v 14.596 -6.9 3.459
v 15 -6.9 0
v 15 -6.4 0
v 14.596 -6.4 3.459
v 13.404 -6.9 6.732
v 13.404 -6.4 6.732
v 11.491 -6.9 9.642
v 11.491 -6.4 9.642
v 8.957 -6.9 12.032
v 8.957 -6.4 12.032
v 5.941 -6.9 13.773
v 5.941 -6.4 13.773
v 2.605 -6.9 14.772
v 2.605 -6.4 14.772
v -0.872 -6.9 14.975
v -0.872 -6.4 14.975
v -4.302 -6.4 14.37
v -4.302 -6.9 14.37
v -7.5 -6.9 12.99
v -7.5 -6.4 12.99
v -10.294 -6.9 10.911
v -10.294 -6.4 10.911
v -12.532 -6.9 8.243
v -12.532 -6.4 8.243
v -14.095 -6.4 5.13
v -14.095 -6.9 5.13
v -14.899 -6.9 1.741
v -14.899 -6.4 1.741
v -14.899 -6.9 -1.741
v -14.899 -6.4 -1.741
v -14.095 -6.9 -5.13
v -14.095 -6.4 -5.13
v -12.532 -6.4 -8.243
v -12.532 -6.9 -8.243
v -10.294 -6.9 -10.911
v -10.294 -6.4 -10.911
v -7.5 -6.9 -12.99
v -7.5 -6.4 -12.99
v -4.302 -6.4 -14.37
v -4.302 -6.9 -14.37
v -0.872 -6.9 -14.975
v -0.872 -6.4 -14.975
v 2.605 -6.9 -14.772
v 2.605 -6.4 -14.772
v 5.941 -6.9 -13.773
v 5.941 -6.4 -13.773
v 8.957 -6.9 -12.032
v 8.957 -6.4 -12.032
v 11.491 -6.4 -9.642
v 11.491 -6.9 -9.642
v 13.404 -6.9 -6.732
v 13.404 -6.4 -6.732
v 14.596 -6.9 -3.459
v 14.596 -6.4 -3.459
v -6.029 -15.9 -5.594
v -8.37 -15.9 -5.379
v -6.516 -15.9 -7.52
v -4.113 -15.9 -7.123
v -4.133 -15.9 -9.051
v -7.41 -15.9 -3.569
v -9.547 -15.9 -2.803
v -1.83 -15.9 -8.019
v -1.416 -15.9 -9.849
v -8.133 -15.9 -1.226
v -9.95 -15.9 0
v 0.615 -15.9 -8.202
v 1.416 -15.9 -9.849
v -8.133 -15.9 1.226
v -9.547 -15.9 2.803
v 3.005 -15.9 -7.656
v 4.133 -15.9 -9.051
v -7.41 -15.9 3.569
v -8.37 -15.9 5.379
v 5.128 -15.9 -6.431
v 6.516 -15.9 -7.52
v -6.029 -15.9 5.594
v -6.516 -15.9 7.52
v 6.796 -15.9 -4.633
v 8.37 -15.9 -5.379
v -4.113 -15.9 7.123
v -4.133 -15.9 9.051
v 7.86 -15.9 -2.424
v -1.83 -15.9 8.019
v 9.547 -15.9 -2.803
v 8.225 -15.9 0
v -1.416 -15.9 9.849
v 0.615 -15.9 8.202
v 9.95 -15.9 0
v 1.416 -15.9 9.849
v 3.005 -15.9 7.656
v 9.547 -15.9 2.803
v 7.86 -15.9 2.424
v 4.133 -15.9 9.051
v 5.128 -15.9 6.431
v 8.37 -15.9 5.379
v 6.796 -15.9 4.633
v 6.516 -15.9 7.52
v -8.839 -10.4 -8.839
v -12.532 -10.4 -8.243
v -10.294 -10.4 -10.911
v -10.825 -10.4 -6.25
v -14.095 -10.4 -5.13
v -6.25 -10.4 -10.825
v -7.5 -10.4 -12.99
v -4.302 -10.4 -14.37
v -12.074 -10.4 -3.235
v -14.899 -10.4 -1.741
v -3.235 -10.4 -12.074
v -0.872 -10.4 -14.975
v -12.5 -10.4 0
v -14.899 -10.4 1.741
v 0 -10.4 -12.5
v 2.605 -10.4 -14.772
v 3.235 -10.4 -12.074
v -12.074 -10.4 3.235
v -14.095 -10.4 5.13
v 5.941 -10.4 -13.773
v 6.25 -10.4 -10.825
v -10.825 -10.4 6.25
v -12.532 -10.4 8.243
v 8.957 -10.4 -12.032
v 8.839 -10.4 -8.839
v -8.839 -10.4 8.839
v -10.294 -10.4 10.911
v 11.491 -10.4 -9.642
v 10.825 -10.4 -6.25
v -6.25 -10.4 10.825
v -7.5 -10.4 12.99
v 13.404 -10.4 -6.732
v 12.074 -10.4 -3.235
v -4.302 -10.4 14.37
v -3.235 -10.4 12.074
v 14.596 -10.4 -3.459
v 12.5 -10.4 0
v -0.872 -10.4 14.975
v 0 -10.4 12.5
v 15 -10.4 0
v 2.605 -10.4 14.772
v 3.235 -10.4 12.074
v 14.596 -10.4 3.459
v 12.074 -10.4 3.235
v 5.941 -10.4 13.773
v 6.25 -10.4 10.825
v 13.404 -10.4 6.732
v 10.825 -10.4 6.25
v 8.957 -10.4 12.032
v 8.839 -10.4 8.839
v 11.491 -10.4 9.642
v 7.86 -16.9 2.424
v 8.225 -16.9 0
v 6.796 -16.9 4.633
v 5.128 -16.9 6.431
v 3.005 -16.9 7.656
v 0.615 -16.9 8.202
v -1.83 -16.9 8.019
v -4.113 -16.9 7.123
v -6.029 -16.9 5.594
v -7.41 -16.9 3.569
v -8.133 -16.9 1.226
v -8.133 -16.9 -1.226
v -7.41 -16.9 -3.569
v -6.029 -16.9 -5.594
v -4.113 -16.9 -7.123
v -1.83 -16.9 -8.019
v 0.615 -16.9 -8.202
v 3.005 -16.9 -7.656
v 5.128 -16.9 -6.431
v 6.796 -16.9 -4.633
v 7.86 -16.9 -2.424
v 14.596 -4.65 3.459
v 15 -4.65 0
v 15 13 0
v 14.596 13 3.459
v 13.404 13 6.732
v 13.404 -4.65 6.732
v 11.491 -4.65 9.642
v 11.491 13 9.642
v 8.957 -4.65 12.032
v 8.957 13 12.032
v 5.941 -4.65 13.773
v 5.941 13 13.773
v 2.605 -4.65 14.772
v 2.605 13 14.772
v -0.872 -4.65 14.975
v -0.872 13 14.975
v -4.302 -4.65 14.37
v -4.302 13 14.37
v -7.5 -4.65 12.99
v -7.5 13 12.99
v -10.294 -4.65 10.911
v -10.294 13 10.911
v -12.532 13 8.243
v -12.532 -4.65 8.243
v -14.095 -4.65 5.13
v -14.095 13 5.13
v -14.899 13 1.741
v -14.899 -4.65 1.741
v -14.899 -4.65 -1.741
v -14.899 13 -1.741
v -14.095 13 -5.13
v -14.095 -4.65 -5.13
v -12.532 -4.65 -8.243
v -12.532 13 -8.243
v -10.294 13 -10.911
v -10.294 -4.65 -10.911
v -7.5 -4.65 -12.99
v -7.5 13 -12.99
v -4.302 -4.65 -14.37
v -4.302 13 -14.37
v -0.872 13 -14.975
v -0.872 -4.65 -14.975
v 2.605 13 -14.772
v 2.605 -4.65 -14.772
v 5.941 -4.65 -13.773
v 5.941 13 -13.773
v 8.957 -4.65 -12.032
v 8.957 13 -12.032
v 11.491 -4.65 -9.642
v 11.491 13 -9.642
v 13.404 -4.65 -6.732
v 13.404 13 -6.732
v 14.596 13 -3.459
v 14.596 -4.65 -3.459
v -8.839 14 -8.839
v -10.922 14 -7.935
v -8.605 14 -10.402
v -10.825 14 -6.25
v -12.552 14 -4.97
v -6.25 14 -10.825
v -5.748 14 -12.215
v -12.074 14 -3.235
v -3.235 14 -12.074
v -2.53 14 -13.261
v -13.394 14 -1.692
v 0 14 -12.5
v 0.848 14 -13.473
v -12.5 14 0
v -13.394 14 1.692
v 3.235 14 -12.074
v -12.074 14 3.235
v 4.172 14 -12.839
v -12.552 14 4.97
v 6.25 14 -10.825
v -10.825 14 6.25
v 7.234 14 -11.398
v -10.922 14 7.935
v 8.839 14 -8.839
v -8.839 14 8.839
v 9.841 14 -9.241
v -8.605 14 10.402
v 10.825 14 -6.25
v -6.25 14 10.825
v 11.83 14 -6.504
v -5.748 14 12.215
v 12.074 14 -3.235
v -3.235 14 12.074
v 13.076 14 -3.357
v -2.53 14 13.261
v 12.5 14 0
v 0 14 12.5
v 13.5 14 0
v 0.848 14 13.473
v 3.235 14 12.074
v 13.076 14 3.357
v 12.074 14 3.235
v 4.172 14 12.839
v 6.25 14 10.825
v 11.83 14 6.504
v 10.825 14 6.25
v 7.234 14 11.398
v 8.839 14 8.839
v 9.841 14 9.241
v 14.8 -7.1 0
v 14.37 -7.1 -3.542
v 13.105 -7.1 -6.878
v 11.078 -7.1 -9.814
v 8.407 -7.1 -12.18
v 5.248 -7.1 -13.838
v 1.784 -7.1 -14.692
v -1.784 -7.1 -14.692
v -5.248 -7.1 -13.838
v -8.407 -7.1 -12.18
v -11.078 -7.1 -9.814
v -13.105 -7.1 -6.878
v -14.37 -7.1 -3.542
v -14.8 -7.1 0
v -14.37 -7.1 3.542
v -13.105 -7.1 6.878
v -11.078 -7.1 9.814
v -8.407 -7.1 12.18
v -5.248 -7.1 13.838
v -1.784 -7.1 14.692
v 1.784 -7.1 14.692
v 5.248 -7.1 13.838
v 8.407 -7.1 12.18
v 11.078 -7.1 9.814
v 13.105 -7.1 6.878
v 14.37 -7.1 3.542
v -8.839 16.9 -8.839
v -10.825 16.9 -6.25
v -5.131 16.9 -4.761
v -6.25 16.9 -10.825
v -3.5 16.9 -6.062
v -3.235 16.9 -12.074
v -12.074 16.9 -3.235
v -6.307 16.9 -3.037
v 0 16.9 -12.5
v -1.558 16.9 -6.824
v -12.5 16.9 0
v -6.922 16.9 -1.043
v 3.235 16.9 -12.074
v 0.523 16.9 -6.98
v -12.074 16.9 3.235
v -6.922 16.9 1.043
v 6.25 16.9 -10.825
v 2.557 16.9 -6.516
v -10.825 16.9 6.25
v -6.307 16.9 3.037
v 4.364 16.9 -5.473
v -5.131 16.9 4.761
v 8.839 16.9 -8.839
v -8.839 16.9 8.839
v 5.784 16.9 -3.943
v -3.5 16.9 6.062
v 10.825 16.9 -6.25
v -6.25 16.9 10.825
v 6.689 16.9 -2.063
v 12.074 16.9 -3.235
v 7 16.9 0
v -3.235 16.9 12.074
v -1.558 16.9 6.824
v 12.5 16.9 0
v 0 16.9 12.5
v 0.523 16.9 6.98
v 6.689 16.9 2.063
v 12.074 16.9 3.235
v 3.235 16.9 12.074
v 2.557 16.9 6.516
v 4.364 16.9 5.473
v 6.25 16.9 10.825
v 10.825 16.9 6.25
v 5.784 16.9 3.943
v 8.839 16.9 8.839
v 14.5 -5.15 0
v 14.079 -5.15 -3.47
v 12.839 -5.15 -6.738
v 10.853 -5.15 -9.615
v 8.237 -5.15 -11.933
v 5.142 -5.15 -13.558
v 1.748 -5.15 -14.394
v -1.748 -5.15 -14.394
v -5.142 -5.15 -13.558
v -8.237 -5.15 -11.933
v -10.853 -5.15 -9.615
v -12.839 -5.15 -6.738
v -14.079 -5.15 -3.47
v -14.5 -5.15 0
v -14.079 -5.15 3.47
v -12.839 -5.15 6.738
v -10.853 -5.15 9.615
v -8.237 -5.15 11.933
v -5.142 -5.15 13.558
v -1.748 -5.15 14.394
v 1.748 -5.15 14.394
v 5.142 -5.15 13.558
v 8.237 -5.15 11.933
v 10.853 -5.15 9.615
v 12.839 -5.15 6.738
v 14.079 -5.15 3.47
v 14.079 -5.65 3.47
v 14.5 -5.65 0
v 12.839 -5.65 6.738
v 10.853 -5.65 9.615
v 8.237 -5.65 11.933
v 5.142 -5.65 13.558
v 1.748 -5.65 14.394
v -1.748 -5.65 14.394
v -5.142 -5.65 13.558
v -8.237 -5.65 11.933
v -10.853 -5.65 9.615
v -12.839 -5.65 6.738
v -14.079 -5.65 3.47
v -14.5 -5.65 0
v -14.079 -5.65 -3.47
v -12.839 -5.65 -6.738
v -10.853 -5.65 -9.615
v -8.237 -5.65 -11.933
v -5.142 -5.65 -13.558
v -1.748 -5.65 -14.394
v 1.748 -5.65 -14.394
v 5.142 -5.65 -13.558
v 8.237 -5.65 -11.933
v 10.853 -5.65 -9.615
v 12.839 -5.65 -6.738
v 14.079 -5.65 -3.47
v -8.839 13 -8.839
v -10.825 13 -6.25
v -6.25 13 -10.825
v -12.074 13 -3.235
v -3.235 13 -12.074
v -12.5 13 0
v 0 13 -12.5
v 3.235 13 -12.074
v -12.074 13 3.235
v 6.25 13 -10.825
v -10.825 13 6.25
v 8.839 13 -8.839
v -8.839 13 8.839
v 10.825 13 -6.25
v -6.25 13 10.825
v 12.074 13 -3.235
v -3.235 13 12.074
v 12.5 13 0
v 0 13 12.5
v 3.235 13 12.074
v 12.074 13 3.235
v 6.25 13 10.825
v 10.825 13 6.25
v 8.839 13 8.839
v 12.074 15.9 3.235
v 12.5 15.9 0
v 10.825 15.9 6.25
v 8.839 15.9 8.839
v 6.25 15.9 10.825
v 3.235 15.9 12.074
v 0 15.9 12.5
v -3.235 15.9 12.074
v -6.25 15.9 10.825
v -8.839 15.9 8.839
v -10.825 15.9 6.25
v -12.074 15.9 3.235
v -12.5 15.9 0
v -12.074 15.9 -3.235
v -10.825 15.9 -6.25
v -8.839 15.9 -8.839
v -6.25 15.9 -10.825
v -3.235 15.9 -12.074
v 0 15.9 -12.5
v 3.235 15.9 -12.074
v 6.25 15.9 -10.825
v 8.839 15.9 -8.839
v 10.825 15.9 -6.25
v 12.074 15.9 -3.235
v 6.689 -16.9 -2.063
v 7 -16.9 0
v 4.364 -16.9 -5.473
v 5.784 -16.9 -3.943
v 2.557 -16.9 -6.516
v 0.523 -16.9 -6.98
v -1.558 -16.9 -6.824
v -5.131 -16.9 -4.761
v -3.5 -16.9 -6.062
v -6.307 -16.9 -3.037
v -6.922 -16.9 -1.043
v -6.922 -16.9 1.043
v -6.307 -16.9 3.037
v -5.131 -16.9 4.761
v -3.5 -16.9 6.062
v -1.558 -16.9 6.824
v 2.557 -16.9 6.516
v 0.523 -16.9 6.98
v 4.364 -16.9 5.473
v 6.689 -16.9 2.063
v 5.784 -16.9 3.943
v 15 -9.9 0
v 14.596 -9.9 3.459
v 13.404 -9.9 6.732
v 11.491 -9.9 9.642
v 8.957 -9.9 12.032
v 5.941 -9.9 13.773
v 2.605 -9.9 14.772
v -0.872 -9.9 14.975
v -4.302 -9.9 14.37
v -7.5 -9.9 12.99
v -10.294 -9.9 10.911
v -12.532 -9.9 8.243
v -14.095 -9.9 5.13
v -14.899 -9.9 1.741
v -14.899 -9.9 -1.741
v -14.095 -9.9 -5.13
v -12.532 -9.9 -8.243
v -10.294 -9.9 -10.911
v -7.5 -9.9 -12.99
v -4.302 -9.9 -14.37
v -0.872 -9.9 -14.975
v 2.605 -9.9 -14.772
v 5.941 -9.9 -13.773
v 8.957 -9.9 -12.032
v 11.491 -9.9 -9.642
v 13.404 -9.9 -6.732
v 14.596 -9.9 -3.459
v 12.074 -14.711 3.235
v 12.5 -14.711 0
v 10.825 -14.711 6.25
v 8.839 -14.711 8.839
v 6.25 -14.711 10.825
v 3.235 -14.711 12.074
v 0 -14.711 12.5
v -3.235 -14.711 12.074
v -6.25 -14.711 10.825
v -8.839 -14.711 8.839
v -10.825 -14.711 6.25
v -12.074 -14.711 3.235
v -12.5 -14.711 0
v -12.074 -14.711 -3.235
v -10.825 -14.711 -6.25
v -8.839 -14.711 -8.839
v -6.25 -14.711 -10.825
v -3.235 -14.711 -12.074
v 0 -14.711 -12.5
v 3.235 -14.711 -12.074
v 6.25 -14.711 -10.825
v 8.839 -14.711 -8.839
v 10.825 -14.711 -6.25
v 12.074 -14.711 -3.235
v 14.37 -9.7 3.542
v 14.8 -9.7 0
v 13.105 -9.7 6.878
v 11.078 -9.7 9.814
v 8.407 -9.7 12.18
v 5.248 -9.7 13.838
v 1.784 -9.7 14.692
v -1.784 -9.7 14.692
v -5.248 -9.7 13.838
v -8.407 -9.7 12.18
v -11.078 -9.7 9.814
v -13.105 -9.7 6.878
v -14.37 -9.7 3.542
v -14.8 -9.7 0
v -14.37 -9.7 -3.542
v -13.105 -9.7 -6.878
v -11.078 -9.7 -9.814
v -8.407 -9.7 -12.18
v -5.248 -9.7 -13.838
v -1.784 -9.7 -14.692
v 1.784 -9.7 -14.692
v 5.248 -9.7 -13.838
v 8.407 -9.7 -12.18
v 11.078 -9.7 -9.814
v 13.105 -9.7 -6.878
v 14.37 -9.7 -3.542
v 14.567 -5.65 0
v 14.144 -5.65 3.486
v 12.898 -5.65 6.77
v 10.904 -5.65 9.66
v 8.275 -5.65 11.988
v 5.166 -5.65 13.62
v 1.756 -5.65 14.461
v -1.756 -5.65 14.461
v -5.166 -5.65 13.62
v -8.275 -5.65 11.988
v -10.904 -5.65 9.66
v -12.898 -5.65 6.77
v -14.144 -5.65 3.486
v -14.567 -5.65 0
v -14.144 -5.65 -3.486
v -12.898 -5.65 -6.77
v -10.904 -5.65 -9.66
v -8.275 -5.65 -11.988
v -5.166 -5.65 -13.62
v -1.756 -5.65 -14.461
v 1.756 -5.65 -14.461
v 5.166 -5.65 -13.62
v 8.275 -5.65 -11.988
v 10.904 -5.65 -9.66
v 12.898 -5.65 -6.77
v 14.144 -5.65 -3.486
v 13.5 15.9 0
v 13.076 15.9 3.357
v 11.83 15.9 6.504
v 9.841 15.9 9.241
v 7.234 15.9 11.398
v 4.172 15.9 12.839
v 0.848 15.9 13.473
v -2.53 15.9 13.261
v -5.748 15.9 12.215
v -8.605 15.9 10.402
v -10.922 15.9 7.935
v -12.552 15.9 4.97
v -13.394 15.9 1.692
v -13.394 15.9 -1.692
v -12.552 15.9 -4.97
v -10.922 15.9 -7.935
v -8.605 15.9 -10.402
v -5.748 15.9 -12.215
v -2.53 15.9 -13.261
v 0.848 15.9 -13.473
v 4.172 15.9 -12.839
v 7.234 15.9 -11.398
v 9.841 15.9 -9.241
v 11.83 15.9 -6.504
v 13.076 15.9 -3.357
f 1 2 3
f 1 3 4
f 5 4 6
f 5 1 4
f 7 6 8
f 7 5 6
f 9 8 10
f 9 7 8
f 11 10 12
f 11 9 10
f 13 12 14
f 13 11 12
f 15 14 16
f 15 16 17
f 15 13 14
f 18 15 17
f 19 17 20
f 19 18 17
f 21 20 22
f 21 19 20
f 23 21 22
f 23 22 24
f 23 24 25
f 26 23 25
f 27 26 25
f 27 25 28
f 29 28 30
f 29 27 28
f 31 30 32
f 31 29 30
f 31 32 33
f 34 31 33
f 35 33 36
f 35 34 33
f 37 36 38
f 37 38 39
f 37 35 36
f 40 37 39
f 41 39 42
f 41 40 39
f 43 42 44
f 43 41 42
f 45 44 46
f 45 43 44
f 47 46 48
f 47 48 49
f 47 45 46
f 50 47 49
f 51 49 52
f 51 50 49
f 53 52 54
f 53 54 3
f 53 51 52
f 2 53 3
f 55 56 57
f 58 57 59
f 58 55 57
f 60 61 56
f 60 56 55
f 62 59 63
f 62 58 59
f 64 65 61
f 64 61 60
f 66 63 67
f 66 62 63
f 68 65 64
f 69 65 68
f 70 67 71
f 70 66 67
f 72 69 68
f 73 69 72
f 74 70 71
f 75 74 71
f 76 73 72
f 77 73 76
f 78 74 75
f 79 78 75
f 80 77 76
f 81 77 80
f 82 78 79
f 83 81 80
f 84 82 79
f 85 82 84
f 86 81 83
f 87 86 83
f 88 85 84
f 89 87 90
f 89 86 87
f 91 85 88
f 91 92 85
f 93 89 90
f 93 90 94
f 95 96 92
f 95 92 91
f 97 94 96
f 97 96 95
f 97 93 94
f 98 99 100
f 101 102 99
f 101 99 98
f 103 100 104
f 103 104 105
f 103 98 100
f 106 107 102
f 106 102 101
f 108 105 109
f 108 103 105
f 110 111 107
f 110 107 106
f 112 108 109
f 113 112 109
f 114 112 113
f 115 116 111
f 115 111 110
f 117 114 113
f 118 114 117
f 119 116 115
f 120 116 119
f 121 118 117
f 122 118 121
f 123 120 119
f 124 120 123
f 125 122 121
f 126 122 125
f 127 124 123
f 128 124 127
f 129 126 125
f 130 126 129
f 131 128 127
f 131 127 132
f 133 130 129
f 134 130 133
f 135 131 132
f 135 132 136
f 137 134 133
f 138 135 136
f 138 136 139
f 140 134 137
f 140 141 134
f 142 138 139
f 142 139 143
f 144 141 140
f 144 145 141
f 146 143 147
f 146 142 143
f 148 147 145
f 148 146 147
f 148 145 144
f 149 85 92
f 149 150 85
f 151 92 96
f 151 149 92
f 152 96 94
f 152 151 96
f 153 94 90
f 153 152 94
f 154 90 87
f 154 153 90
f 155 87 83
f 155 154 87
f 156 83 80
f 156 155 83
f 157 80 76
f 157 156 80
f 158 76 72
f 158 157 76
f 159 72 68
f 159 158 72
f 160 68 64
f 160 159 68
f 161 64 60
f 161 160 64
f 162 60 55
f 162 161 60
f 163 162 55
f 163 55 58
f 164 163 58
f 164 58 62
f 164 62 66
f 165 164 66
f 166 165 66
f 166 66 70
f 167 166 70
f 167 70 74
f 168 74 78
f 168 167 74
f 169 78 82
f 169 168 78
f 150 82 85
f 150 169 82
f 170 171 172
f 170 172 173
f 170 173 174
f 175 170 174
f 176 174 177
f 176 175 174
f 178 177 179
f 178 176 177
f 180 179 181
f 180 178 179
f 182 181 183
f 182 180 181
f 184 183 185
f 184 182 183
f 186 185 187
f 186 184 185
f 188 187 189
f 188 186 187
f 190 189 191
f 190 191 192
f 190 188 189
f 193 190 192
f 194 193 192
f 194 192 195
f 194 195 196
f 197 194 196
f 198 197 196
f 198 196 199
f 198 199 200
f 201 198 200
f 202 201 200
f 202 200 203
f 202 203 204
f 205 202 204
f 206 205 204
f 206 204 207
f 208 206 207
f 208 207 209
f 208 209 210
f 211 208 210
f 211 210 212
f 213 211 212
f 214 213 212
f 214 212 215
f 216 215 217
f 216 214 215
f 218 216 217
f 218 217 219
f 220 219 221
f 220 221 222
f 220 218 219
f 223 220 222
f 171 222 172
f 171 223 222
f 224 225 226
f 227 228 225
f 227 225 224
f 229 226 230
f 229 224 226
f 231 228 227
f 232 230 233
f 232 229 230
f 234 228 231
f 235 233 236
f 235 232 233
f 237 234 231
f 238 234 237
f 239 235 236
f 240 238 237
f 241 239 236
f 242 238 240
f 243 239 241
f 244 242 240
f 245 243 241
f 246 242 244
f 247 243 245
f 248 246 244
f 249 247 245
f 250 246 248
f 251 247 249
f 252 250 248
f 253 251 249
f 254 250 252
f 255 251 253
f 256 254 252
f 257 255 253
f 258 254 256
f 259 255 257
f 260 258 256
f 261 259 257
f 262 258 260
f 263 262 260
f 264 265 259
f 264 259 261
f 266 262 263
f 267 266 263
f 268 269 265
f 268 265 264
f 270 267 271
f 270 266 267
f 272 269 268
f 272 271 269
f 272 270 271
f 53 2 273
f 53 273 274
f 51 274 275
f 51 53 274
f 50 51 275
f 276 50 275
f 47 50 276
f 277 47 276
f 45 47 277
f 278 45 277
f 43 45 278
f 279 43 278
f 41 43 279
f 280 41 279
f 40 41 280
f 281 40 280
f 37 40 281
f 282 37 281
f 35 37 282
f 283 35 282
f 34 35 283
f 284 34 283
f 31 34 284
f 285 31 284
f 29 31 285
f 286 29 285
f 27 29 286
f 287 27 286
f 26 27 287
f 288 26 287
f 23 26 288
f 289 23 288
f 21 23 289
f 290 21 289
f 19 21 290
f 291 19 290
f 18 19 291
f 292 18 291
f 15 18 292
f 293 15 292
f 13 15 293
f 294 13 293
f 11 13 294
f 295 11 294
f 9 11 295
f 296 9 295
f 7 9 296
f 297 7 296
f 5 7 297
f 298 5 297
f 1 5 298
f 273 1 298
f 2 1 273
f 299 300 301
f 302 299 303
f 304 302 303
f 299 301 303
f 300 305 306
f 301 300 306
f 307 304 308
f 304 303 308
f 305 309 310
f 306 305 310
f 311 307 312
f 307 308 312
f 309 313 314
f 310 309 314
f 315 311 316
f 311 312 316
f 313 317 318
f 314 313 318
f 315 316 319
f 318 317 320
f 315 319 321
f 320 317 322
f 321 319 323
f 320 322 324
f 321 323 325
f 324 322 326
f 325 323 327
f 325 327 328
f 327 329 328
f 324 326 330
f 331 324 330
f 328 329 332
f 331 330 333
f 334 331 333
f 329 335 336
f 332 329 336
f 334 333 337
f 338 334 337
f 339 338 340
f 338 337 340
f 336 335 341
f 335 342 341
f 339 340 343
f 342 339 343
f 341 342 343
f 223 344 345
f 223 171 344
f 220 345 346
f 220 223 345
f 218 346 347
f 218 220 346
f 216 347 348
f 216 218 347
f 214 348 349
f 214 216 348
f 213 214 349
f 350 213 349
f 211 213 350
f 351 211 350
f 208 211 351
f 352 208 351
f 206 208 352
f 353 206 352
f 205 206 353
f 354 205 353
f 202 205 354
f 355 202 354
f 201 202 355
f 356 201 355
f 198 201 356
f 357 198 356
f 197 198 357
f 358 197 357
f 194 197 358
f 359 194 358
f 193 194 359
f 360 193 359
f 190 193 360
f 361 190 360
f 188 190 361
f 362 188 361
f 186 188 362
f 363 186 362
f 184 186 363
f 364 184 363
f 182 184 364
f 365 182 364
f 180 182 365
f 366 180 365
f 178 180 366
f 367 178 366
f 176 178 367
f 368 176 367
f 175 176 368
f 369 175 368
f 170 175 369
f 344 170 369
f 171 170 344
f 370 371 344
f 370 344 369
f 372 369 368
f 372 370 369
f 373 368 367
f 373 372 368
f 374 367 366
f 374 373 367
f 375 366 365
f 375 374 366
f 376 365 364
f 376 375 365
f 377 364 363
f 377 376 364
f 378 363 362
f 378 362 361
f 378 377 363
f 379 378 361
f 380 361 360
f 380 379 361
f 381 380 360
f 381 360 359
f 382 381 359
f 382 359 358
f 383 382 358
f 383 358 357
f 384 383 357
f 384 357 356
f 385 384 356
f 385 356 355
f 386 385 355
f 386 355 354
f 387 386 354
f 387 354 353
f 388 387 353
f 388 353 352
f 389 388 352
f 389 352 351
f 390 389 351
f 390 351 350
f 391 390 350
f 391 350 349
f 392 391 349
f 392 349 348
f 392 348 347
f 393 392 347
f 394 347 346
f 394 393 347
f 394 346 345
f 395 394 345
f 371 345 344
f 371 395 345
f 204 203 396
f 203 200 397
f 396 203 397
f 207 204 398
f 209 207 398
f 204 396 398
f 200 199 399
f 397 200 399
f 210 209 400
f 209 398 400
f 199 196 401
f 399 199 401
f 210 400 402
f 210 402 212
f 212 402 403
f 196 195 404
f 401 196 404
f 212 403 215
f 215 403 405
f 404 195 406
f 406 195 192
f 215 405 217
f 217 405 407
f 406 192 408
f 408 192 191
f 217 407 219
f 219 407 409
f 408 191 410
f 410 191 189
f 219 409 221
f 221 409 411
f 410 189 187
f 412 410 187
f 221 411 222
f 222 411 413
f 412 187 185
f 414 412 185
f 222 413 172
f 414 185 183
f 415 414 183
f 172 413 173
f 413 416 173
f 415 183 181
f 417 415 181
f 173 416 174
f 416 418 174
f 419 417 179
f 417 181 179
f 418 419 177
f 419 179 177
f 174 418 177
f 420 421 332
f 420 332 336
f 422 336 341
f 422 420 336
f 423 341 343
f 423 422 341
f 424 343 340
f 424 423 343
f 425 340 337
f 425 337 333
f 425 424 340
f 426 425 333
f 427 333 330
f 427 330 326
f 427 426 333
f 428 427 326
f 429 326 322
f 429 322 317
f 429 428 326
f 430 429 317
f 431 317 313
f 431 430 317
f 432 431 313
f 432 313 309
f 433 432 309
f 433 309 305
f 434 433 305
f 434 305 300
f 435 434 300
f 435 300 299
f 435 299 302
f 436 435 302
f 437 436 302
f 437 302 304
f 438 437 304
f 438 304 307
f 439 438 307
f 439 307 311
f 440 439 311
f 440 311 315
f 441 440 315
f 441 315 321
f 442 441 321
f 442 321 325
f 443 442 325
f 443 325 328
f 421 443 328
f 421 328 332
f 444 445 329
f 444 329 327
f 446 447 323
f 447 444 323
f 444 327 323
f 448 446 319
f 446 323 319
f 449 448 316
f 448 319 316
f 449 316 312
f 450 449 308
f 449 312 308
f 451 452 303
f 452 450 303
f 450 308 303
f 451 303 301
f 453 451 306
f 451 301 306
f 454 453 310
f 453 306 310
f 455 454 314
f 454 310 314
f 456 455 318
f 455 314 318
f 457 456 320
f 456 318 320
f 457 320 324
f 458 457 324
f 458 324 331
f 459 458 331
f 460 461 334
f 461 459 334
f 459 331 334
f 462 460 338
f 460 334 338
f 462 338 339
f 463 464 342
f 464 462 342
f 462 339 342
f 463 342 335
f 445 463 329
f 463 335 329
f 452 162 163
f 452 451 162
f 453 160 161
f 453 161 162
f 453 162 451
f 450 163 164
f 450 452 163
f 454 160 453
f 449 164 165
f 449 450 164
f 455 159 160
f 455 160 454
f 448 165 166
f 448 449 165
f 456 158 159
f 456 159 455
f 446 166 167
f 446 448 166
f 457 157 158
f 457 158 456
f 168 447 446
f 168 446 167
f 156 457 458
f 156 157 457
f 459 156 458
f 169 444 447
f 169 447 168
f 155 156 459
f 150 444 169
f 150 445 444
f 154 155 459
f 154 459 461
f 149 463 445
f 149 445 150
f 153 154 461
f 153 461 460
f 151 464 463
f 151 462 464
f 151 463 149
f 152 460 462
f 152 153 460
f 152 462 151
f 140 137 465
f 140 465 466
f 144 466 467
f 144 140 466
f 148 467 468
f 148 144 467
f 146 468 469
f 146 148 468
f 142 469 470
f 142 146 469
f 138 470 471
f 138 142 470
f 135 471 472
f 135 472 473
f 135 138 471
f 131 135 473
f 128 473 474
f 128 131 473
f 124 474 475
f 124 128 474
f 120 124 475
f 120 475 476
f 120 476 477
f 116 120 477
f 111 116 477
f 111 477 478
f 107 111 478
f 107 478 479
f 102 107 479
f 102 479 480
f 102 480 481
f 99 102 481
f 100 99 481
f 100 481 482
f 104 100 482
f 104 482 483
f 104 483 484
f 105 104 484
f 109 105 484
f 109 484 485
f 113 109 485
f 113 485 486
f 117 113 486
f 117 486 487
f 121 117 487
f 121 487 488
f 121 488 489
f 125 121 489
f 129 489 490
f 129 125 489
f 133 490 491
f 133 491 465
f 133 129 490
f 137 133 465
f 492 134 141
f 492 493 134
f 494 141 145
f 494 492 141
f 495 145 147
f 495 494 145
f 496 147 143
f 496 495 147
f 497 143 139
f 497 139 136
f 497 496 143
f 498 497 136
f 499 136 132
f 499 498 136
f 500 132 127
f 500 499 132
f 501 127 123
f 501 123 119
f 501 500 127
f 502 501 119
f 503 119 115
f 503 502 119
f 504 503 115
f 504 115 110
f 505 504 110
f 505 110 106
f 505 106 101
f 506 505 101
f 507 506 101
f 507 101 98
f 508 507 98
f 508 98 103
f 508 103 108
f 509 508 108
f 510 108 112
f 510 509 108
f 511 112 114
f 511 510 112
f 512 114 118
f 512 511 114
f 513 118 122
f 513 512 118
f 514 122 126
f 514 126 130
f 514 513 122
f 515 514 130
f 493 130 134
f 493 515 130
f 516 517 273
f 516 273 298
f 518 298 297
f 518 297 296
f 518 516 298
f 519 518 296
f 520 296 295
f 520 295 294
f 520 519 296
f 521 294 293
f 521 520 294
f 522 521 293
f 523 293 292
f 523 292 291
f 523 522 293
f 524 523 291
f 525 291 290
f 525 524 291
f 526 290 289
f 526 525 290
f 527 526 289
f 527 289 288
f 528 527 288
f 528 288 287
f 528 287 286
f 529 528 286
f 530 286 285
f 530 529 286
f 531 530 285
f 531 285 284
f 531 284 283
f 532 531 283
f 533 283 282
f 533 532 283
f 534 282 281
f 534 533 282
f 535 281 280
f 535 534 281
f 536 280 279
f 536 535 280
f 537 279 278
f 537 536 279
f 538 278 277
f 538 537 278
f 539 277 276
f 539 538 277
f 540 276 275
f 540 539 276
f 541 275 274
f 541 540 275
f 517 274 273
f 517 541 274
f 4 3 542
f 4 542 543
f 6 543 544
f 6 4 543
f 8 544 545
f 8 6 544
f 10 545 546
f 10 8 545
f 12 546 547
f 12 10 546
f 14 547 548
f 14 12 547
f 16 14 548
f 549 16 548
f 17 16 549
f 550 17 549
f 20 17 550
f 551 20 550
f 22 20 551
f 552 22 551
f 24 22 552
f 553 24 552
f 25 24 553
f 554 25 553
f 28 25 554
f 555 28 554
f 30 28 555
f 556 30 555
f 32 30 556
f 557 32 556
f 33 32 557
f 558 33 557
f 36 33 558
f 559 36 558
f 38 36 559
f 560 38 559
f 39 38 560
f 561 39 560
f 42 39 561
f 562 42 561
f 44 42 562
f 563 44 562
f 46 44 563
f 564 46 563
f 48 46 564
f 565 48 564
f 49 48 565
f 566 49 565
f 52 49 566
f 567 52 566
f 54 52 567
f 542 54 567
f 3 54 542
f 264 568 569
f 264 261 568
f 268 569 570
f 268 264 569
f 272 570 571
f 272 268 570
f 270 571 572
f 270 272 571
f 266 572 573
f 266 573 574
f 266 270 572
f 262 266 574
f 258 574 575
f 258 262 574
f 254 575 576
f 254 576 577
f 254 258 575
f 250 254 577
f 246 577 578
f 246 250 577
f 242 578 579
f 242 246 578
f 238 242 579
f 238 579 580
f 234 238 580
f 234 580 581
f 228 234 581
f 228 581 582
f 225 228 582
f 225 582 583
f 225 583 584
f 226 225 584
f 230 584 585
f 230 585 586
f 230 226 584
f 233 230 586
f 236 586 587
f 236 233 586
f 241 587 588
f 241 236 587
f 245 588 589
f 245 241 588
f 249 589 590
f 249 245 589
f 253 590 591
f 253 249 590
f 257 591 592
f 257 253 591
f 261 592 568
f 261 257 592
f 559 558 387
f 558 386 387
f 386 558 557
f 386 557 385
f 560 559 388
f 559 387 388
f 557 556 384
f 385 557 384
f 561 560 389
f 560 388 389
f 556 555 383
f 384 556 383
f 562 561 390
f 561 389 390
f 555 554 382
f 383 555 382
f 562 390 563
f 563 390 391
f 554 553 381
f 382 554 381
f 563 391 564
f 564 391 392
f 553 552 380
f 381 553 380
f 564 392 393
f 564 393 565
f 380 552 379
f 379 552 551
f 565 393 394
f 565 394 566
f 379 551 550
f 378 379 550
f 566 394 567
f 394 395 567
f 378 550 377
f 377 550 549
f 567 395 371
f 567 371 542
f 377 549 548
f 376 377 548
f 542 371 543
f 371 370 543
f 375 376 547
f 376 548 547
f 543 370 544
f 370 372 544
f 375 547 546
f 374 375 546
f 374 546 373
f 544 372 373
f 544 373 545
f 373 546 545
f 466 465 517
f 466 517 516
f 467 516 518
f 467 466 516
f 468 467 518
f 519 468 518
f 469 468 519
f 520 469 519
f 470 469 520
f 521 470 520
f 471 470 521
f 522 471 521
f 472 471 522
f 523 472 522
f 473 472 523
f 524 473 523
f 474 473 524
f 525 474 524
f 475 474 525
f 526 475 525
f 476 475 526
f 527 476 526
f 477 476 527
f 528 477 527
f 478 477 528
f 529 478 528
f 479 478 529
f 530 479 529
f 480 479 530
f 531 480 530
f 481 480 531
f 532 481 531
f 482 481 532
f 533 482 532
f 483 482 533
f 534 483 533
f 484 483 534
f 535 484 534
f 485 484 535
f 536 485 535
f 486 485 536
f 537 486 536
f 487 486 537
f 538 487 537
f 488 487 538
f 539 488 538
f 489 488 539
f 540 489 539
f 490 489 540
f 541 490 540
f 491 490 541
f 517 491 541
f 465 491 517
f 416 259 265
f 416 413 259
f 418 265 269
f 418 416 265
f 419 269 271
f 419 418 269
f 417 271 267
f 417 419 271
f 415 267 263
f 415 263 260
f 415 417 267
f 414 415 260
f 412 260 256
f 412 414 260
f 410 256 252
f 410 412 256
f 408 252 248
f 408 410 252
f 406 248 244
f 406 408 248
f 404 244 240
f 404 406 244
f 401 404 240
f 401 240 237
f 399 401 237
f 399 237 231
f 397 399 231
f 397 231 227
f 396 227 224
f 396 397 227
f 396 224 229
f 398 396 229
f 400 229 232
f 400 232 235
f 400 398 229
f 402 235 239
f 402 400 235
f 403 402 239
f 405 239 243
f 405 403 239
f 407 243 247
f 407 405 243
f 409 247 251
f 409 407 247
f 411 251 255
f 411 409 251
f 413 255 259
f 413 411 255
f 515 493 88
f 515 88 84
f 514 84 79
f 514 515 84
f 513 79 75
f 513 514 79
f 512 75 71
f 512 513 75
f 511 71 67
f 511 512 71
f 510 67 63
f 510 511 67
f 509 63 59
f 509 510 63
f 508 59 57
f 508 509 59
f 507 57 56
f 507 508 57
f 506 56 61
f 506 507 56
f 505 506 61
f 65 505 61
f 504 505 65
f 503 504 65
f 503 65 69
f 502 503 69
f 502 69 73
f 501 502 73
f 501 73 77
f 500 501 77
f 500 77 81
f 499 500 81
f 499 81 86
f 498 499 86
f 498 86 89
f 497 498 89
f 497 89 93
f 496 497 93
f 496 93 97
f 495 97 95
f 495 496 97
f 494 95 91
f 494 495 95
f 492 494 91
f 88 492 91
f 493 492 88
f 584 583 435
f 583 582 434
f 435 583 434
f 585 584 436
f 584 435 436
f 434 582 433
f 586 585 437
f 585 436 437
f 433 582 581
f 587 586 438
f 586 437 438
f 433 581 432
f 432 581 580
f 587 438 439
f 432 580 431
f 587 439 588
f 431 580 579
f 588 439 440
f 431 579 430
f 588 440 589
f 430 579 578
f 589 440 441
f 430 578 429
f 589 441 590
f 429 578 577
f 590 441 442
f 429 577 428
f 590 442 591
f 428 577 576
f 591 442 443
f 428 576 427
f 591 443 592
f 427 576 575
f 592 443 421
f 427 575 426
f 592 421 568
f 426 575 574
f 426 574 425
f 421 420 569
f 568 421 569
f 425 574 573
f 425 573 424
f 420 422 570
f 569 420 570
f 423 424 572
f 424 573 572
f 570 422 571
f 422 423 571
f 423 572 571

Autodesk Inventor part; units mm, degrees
ref_plane "YZ Plane" through (0, 0, 0) normal (1, 0, 0) x (0, 1, 0)
ref_plane "XZ Plane" through (0, 0, 0) normal (0, 1, 0) x (-1, 0, 0)
ref_plane "XY Plane" through (0, 0, 0) normal (0, 0, 1) x (1, 0, 0)
sketch "Skizze1" plane through (0, 0, 0) normal (0, 0, 1) x (1, 0, 0)
  line L0 (0, 146.3203) -> (0, -146.3203) construction
  line L1 (7, -16.9) -> (7, 16.9)
  line L2 (7, 16.9) -> (12.5, 16.9)
  line L3 (12.5, 16.9) -> (12.5, 15.9)
  line L4 (12.5, 15.9) -> (13.5, 15.9)
  line L5 (13.5, 15.9) -> (13.5, 14)
  line L6 (13.5, 14) -> (12.5, 14)
  line L7 (12.5, 14) -> (12.5, 13)
  line L8 (12.5, 13) -> (15, 13)
  line L9 (15, 13) -> (15, -4.65)
  line L10 (15, -4.65) -> (14.5, -5.15)
  line L11 (14.5, -5.15) -> (14.5, -5.65)
  line L12 (15, -6.4) -> (15, -6.9)
  line L13 (15, -6.9) -> (14.8, -7.1)
  line L14 (14.8, -7.1) -> (14.8, -9.7)
  line L15 (14.8, -9.7) -> (15, -9.9)
  line L16 (15, -9.9) -> (15, -10.4)
  line L17 (15, -10.4) -> (12.5, -10.4)
  line L18 (12.5, -10.4) -> (12.5, -14.7109)
  line L19 (12.5, -14.7109) -> (9.95, -15.9)
  line L20 (9.95, -15.9) -> (8.225, -15.9)
  line L21 (8.225, -15.9) -> (8.225, -16.9)
  line L22 (8.225, -16.9) -> (7, -16.9)
  line L23 (15, -6.4) -> (14.567, -5.65)
  line L24 (14.567, -5.65) -> (14.5, -5.65)
  line L25 (0, 0) -> (7, 0) construction
  dimension "d0" = 15
  dimension "d1" = 29.9
  dimension "d2" = 3.9
  dimension "d3" = 25
  dimension "d7" = 28.9
  dimension "d8" = 23.4
  dimension "d11" = 1
  dimension "d12" = 1
  dimension "d13" = 14.8
  dimension "d14" = 2.6
  dimension "d15" = 14.5
  dimension "d16" = 1.75
  dimension "d17" = 0.5
  dimension "d18" = 0.5
  dimension "d19" = 8.225
  dimension "d20" = 9.95
  dimension "d21" = 12.5
  dimension "d22" = 13.5
  dimension "d23" = 12.5
  dimension "d24" = 45
  dimension "d25" = 30
  dimension "d26" = 45
  dimension "d27" = 0.75
  dimension "d28" = 7
revolve "Umdrehung1" add sketch "Skizze1" angle 360 about axis through (0, 146.3203, 0) along (0, -1, 0)
thread "Gewinde1" size "M27x0.75" class "6g" standard "ANSI Metric M Profile" full length
ref_plane "image plane" through (0, -32, 0) normal (0, 1, 0) x (1, 0, 0)
properties part number "ZEISS EC Epiplan-Neofluar (422320-9900-000)"
